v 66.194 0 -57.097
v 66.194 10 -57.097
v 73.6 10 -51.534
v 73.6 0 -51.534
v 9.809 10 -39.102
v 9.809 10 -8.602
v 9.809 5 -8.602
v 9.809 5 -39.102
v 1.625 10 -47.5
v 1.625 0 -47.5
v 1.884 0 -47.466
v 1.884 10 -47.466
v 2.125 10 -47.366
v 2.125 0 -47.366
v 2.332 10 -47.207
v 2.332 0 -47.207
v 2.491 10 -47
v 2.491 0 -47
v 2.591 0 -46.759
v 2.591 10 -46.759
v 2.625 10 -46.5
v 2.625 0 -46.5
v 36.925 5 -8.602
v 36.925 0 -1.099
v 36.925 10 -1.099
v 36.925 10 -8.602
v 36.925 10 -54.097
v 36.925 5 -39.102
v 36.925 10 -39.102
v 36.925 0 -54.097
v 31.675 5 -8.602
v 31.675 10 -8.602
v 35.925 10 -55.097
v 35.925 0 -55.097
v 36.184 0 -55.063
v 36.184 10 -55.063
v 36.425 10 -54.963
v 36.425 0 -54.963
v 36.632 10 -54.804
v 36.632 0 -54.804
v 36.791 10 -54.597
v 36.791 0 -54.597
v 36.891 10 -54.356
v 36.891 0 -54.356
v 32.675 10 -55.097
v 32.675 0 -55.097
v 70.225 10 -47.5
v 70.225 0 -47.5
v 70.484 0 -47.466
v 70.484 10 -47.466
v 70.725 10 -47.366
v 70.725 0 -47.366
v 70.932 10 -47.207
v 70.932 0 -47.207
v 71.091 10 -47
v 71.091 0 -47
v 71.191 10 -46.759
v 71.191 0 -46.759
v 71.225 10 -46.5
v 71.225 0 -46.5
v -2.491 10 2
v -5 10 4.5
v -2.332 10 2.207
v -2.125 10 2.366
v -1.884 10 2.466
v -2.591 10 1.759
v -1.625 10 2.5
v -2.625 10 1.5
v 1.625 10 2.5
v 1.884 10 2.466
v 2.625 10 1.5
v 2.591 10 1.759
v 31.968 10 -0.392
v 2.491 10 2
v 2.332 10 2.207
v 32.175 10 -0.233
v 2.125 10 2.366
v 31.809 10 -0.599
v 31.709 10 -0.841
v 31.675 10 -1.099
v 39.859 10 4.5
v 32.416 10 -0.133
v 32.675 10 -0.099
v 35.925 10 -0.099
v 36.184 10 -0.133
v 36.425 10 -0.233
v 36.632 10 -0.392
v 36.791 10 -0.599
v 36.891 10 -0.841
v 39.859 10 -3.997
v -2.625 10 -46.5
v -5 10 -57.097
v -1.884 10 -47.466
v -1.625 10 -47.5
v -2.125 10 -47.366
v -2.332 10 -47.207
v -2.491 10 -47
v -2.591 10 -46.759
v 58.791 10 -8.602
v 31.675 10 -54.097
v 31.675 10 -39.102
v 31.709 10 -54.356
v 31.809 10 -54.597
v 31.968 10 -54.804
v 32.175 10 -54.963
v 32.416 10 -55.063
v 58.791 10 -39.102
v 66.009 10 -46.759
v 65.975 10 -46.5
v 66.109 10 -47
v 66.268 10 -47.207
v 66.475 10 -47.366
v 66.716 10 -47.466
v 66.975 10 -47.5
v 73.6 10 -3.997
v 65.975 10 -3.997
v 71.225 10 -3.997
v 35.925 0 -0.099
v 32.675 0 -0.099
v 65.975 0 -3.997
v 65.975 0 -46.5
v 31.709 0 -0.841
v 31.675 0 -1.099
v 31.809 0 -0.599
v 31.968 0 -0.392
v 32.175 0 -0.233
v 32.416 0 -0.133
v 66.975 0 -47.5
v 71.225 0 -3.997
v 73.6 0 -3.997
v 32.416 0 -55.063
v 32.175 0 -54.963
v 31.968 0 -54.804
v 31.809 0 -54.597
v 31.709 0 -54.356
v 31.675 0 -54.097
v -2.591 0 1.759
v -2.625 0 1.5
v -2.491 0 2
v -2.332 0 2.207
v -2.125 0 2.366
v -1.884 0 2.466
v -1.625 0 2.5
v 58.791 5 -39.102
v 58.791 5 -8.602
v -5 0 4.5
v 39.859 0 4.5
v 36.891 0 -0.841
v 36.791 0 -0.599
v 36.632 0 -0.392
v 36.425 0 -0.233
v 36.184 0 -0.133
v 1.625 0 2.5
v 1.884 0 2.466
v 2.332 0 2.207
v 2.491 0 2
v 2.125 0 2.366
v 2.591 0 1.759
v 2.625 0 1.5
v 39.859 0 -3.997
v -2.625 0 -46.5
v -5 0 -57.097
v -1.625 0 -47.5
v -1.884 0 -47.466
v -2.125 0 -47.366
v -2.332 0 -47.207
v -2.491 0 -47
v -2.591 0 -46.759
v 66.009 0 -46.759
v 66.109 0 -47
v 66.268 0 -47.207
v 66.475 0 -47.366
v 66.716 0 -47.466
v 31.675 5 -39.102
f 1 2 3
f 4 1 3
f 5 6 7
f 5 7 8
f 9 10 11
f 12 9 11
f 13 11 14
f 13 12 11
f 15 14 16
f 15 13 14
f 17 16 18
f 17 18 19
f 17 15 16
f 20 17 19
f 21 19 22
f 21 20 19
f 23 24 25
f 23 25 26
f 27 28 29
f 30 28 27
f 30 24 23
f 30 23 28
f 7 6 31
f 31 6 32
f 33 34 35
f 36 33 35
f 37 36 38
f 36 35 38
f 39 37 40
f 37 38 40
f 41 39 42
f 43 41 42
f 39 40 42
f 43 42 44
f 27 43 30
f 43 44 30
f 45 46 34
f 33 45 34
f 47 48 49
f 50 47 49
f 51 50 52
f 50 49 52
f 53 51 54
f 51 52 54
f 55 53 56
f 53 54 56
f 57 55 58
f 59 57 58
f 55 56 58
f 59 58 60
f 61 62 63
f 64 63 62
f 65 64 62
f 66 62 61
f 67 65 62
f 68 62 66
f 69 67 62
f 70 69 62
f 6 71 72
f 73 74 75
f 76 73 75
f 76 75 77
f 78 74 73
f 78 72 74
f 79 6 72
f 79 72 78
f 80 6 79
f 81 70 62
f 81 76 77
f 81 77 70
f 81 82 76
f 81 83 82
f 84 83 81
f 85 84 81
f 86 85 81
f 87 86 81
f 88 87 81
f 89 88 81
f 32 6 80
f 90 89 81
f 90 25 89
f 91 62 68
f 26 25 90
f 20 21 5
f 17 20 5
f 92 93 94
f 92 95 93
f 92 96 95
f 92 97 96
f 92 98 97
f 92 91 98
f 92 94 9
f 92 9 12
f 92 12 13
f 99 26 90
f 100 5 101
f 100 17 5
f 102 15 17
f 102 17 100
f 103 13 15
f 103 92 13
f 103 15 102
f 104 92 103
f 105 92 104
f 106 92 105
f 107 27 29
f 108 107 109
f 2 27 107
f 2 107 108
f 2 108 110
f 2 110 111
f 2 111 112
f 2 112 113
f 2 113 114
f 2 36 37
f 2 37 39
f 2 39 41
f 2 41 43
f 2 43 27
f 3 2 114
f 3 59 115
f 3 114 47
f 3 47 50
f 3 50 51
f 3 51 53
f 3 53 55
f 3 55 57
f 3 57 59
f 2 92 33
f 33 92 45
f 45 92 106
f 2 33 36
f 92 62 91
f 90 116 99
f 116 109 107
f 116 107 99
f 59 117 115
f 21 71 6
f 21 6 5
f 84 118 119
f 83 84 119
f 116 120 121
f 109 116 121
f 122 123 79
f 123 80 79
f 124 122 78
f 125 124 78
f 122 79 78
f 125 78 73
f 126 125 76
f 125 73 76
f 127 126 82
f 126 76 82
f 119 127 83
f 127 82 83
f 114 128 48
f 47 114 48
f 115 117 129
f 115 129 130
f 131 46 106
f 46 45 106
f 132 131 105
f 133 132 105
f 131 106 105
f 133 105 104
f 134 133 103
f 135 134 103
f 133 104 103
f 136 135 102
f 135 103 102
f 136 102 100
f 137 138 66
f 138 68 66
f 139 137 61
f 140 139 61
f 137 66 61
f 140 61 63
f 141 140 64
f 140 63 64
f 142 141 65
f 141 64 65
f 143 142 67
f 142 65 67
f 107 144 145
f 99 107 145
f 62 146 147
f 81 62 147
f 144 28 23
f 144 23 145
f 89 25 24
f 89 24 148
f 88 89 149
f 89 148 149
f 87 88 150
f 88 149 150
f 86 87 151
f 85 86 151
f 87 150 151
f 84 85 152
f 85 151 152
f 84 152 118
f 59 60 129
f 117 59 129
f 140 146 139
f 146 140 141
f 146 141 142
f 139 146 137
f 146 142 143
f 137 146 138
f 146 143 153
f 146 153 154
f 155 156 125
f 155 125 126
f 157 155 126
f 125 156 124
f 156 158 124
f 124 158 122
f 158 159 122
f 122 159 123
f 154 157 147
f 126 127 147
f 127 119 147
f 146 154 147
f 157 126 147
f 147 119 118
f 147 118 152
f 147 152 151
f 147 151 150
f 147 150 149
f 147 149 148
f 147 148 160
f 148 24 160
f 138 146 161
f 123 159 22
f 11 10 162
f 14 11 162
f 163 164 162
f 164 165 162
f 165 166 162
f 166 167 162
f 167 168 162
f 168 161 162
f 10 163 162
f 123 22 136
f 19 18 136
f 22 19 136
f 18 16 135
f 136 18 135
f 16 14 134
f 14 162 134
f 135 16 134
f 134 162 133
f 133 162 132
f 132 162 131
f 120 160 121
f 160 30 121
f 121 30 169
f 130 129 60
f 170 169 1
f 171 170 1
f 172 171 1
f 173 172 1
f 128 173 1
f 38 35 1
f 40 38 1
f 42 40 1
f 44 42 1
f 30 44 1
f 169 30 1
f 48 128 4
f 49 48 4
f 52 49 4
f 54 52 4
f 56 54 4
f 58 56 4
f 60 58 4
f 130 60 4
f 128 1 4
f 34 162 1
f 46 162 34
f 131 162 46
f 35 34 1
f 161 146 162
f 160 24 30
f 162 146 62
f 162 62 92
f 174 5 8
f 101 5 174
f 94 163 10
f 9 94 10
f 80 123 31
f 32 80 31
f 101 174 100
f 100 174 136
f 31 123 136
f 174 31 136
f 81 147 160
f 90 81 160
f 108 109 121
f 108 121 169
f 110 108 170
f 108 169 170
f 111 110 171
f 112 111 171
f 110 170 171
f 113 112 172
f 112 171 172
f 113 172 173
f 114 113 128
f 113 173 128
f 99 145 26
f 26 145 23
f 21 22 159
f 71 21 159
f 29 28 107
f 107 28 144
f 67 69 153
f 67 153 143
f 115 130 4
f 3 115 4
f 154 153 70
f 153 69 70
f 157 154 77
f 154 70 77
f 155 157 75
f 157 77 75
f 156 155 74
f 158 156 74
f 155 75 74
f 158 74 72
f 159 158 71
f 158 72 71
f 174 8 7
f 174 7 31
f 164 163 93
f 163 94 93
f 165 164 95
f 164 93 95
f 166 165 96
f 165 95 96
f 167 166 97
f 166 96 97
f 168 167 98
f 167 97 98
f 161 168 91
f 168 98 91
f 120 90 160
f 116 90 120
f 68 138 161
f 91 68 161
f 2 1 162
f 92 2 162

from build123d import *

# Parameters (mm, degrees)
BOSS_EXTRUDE1_DEPTH = 10
FILLET1_R           = 1
SKETCH2_W           = 21.86553483
SKETCH2_H           = 30.5
CUT_EXTRUDE1_DEPTH  = 5
MIRROR1_DEPTH       = 10
MIRROR1_2_OUTLINE_W = 21.86553483
MIRROR1_2_OUTLINE_H = 30.5
MIRROR1_2_DEPTH     = 5
SKETCH6_W           = 43.680332617
SKETCH6_H           = 16.249834628
CUT_EXTRUDE2_DEPTH  = 10


# Read off the part's stored shape, not the designer's step: Mirror1
with BuildPart() as part:
    # Sketch1 → Boss-Extrude1 (new body)
    with BuildSketch(Plane(origin=(0, 0, 0), x_dir=(1, 0, 0), z_dir=(0, 1, 0))):
        Polygon((-5, 57.097150921), (34.3, 57.097150921), (34.3, 55.097150921), (31.675, 55.097150921), (31.675, 52.597150921), (31.675, 2.599340873), (31.675, 0.099340873), (34.3, 0.099340873), (34.3, -4.5), (-5, -4.5), align=None)
        Polygon((-2.625, 45), (-2.625, 0), (-2.625, -2.5), (0, -2.5), (2.625, -2.5), (2.625, 0), (2.625, 45), (2.625, 47.5), (0, 47.5), (-2.625, 47.5), align=None, mode=Mode.SUBTRACT)
    extrude(amount=BOSS_EXTRUDE1_DEPTH)

    # Fillet1
    fillet1_edges = [part.edges().sort_by_distance(p)[0] for p in [
        (31.675, 5, -55.097150921),
        (31.675, 5, -0.099340873),
        (-2.625, 5, -47.5),
        (-2.625, 5, 2.5),
        (2.625, 5, 2.5),
        (2.625, 5, -47.5),
    ]]
    fillet(fillet1_edges, radius=FILLET1_R)

    # Sketch2 → Cut-Extrude1 (cut)
    with BuildSketch(Plane(origin=(0, 10, 0), x_dir=(1, 0, 0), z_dir=(0, 1, 0))):
        with Locations((20.742232585, 23.8519351)):
            Rectangle(SKETCH2_W, SKETCH2_H)
    extrude(amount=-CUT_EXTRUDE1_DEPTH, mode=Mode.SUBTRACT)

    # Mirror1 outline → Mirror1 (add)
    with BuildSketch(Plane(origin=(0, 0, 0), x_dir=(1, 0, 0), z_dir=(0, 1, 0))):
        with BuildLine():
            ThreePointArc((35.925, 55.097150921), (36.632106781, 54.804257702), (36.925, 54.097150921))
            Line((36.925, 54.097150921), (36.925, 39.1019351))
            Line((36.925, 39.1019351), (58.79053483, 39.1019351))
            Line((58.79053483, 39.1019351), (58.79053483, 8.6019351))
            Line((58.79053483, 8.6019351), (36.925, 8.6019351))
            Line((36.925, 8.6019351), (36.925, 1.099340873))
            ThreePointArc((36.925, 1.099340873), (36.632106781, 0.392234092), (35.925, 0.099340873))
            Line((35.925, 0.099340873), (34.3, 0.099340873))
            Line((34.3, 0.099340873), (34.3, -4.5))
            Line((34.3, -4.5), (73.6, -4.5))
            Line((73.6, -4.5), (73.6, 57.097150921))
            Line((73.6, 57.097150921), (34.3, 57.097150921))
            Line((34.3, 57.097150921), (34.3, 55.097150921))
            Line((34.3, 55.097150921), (35.925, 55.097150921))
        make_face()
        with BuildLine():
            Line((70.225, -2.5), (66.975, -2.5))
            ThreePointArc((66.975, -2.5), (66.267893219, -2.207106781), (65.975, -1.5))
            Line((65.975, -1.5), (65.975, 46.5))
            ThreePointArc((65.975, 46.5), (66.267893219, 47.207106781), (66.975, 47.5))
            Line((66.975, 47.5), (70.225, 47.5))
            ThreePointArc((70.225, 47.5), (70.932106781, 47.207106781), (71.225, 46.5))
            Line((71.225, 46.5), (71.225, -1.5))
            ThreePointArc((71.225, -1.5), (70.932106781, -2.207106781), (70.225, -2.5))
        make_face(mode=Mode.SUBTRACT)
    extrude(amount=MIRROR1_DEPTH)

    # Mirror1 2 outline → Mirror1 2 (add)
    with BuildSketch(Plane(origin=(0, 0, 0), x_dir=(1, 0, 0), z_dir=(0, 1, 0))):
        with Locations((47.857767415, 23.8519351)):
            Rectangle(MIRROR1_2_OUTLINE_W, MIRROR1_2_OUTLINE_H)
    extrude(amount=MIRROR1_2_DEPTH)

    # Sketch6 → Cut-Extrude2 (cut)
    with BuildSketch(Plane(origin=(0, 10, 0), x_dir=(1, 0, 0), z_dir=(0, 1, 0))):
        with Locations((61.699631479, -4.127511542)):
            Rectangle(SKETCH6_W, SKETCH6_H)
        Polygon((66.193799085, 57.097150921), (73.6, 51.534362723), (73.6, 57.097150921), align=None)
    extrude(amount=-CUT_EXTRUDE2_DEPTH, mode=Mode.SUBTRACT)


solid = part.part
